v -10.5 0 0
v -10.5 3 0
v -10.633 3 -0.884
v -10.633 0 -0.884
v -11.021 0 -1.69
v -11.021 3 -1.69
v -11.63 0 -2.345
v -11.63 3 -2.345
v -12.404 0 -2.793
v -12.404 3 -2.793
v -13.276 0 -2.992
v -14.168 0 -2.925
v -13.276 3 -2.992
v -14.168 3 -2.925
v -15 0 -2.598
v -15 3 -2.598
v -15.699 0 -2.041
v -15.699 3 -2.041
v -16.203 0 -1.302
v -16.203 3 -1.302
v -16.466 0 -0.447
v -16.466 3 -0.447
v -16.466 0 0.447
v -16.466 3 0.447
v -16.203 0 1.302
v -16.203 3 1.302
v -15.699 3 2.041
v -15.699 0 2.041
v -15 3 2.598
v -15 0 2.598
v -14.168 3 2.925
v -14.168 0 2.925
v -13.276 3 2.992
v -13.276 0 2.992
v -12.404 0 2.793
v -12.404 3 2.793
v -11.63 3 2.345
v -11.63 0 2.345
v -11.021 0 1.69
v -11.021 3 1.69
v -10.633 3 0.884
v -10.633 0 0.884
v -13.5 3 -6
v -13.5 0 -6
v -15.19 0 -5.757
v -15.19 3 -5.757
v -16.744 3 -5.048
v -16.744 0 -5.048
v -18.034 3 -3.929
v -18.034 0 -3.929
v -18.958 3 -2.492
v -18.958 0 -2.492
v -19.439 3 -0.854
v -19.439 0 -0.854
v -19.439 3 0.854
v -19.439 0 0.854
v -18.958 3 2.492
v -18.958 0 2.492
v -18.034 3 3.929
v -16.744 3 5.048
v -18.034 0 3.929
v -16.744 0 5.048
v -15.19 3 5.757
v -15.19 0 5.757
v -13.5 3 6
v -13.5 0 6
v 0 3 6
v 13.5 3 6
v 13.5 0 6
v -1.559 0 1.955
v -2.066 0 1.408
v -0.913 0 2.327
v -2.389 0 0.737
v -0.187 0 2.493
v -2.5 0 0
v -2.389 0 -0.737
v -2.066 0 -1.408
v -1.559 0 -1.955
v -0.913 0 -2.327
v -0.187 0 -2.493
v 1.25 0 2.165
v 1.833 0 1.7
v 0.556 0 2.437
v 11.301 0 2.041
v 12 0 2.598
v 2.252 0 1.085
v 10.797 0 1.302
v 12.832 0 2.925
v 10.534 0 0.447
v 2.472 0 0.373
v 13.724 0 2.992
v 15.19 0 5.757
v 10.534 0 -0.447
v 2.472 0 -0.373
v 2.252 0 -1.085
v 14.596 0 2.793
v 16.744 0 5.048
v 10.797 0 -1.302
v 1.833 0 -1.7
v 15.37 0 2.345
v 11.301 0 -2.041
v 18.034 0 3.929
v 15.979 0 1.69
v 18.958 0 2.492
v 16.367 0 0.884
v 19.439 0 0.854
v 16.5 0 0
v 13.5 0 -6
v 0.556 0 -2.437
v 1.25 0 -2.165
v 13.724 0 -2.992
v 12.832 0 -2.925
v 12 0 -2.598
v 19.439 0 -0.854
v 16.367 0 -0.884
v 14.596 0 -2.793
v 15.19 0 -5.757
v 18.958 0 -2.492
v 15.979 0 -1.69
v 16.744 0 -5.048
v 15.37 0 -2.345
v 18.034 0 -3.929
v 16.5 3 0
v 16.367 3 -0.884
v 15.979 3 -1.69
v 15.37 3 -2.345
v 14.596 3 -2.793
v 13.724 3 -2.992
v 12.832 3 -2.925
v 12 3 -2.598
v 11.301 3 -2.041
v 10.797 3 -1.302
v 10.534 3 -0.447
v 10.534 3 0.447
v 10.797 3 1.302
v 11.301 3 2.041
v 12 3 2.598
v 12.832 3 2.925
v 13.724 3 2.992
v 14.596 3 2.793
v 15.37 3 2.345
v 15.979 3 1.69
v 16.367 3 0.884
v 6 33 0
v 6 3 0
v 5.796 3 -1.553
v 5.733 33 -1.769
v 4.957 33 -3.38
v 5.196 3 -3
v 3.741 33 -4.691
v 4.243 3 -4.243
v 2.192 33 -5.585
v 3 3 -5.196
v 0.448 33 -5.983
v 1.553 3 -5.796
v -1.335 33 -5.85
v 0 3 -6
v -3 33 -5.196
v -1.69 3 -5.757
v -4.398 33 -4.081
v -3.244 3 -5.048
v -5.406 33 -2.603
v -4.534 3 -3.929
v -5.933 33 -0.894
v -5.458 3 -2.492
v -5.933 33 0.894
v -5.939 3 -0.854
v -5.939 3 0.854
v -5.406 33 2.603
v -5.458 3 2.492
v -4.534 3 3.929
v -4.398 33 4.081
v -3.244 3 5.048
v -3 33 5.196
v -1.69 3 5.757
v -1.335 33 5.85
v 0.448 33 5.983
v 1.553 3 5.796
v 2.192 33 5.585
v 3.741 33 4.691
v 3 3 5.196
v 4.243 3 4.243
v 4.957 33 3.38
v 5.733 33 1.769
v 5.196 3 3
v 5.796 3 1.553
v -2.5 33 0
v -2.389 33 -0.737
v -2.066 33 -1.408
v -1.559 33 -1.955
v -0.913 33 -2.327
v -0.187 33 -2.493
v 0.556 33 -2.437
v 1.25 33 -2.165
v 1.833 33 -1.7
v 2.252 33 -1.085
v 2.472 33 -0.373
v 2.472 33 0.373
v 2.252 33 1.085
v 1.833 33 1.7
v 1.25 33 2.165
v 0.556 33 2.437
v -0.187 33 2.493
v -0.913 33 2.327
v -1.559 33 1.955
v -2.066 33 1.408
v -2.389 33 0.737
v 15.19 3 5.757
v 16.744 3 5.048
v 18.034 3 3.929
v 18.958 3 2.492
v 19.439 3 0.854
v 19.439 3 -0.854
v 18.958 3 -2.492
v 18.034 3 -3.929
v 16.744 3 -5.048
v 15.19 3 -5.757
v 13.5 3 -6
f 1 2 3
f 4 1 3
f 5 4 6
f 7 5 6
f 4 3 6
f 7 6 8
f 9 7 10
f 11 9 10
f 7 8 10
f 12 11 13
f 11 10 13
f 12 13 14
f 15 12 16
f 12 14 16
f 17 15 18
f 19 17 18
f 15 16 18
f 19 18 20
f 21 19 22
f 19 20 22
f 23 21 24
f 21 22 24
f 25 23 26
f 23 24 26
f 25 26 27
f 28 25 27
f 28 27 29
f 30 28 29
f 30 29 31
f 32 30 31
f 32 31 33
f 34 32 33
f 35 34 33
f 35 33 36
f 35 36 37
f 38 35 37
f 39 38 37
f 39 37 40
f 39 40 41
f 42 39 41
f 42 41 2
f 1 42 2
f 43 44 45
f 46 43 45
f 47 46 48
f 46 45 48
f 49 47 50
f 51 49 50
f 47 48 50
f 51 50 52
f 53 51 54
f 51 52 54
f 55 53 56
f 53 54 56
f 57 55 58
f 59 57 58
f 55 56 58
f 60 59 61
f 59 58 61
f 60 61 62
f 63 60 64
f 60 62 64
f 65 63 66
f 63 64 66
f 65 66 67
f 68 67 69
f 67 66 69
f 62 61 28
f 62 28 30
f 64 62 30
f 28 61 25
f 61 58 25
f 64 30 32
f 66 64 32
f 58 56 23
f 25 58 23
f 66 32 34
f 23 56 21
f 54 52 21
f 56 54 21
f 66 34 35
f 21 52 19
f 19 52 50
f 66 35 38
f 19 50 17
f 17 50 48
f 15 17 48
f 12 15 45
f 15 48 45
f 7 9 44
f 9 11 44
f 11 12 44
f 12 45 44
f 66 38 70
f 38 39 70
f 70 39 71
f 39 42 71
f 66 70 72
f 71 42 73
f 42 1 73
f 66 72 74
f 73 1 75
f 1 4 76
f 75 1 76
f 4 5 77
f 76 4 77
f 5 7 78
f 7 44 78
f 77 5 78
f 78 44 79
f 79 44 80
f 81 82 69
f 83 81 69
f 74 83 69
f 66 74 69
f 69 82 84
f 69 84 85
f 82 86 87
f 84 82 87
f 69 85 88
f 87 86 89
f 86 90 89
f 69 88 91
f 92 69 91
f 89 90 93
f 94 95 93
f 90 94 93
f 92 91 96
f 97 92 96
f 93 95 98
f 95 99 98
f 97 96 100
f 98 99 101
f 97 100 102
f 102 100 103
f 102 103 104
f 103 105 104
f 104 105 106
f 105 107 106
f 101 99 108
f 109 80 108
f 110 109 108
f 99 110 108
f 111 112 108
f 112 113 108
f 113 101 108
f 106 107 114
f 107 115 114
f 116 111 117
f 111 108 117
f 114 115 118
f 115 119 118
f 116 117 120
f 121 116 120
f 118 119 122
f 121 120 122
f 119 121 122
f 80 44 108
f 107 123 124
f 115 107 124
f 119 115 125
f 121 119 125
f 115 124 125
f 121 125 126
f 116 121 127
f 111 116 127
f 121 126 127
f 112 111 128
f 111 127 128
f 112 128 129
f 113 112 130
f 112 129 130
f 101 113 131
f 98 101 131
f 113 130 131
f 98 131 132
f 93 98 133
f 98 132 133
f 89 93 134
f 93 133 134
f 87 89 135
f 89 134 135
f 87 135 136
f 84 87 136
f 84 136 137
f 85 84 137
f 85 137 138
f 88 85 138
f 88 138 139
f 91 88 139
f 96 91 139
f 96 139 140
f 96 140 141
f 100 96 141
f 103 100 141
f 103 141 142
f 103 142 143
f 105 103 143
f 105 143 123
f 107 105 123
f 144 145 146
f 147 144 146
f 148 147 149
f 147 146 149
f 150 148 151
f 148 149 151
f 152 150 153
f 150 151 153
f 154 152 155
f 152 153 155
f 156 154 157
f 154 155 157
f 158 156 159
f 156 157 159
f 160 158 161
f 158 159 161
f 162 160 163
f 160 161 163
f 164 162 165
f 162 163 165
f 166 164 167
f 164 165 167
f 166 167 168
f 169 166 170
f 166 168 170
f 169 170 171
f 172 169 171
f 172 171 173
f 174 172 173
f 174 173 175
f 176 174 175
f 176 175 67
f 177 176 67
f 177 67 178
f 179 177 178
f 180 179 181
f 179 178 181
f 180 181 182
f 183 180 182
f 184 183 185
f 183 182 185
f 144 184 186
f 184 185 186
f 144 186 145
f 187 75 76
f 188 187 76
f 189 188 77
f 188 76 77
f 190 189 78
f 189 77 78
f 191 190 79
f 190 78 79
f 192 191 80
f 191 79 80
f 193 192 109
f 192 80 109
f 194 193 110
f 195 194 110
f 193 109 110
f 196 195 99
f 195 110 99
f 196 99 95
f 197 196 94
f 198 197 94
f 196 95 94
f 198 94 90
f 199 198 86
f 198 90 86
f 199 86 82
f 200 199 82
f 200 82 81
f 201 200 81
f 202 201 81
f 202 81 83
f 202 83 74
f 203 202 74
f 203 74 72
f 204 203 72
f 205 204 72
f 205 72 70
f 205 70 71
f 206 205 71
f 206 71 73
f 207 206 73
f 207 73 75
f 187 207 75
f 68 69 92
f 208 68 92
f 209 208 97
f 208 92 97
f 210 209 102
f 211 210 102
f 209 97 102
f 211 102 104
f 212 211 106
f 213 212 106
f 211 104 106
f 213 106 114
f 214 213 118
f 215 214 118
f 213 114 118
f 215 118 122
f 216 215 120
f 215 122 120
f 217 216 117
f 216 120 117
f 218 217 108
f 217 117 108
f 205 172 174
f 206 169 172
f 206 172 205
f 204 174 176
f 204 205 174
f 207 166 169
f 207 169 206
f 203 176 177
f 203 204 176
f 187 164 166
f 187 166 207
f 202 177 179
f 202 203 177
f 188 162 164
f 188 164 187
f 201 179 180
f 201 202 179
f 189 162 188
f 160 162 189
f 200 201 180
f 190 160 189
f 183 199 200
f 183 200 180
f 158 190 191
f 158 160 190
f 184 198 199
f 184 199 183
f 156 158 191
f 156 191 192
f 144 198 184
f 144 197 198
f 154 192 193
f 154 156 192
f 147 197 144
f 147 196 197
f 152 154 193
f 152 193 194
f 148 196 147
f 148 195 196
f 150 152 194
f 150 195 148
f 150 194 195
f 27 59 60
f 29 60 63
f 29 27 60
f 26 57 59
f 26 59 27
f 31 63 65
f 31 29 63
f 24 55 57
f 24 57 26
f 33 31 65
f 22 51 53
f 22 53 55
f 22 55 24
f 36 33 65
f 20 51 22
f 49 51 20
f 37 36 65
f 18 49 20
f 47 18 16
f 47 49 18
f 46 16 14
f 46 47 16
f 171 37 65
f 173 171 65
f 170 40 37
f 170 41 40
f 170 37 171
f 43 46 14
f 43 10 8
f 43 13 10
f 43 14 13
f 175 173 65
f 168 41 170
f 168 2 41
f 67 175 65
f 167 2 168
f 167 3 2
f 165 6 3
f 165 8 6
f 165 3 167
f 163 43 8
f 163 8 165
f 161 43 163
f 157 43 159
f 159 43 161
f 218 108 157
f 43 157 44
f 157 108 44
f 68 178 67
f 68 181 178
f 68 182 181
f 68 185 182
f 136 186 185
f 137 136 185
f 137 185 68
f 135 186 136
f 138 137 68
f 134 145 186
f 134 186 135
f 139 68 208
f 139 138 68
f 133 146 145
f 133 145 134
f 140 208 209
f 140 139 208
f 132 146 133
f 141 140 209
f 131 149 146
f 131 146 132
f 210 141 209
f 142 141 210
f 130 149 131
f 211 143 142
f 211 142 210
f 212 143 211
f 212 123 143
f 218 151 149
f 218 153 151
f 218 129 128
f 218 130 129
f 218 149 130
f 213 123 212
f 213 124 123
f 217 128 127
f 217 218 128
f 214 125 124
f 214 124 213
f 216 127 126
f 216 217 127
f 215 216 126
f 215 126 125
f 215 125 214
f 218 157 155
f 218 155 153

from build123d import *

# Parameters (mm, degrees)
SKETCH_1_R          = 6
EXTRUDE_1_DEPTH     = 3
SKETCH_2_R          = 6
EXTRUDE_2_DEPTH     = 30
HOLE_WIZARD_M6_1_D  = 5
SKETCH_6_R          = 3
CUT_EXTRUDE_1_DEPTH = 10


with BuildPart() as part:
    # 草图1 → 凸台-拉伸1 (new body)
    with BuildSketch(Plane(origin=(0, 0, 0), x_dir=(1, 0, 0), z_dir=(0, 1, 0))):
        with Locations((-13.5, 0)):
            Circle(SKETCH_1_R)
        with BuildLine():
            Line((13.5, 6), (-13.5, 6))
            ThreePointArc((-13.5, 6), (-9.257359313, 4.242640687), (-7.5, 0))
            ThreePointArc((-7.5, 0), (-9.257359313, -4.242640687), (-13.5, -6))
            Line((-13.5, -6), (13.5, -6))
            ThreePointArc((13.5, -6), (7.5, 0), (13.5, 6))
        make_face()
        with Locations((13.5, 0)):
            Circle(SKETCH_1_R)
    extrude(amount=EXTRUDE_1_DEPTH)

    # 草图2 → 凸台-拉伸2 (add)
    with BuildSketch(Plane(origin=(0, 3, 0), x_dir=(1, 0, 0), z_dir=(0, 1, 0))):
        Circle(SKETCH_2_R)
    extrude(amount=EXTRUDE_2_DEPTH)

    # M6 螺纹孔1 (through all)
    with Locations(Plane(origin=(0, 33, 0), x_dir=(1, 0, 0), z_dir=(0, 1, 0))):
        with Locations((0, 0)):
            Hole(HOLE_WIZARD_M6_1_D / 2)

    # 草图6 → 切除-拉伸1 (cut)
    with BuildSketch(Plane(origin=(0, 3, 0), x_dir=(1, 0, 0), z_dir=(0, 1, 0))):
        with Locations((-13.5, 0)):
            Circle(SKETCH_6_R)
        with Locations((13.5, 0)):
            Circle(SKETCH_6_R)
    extrude(amount=-CUT_EXTRUDE_1_DEPTH, mode=Mode.SUBTRACT)


solid = part.part
